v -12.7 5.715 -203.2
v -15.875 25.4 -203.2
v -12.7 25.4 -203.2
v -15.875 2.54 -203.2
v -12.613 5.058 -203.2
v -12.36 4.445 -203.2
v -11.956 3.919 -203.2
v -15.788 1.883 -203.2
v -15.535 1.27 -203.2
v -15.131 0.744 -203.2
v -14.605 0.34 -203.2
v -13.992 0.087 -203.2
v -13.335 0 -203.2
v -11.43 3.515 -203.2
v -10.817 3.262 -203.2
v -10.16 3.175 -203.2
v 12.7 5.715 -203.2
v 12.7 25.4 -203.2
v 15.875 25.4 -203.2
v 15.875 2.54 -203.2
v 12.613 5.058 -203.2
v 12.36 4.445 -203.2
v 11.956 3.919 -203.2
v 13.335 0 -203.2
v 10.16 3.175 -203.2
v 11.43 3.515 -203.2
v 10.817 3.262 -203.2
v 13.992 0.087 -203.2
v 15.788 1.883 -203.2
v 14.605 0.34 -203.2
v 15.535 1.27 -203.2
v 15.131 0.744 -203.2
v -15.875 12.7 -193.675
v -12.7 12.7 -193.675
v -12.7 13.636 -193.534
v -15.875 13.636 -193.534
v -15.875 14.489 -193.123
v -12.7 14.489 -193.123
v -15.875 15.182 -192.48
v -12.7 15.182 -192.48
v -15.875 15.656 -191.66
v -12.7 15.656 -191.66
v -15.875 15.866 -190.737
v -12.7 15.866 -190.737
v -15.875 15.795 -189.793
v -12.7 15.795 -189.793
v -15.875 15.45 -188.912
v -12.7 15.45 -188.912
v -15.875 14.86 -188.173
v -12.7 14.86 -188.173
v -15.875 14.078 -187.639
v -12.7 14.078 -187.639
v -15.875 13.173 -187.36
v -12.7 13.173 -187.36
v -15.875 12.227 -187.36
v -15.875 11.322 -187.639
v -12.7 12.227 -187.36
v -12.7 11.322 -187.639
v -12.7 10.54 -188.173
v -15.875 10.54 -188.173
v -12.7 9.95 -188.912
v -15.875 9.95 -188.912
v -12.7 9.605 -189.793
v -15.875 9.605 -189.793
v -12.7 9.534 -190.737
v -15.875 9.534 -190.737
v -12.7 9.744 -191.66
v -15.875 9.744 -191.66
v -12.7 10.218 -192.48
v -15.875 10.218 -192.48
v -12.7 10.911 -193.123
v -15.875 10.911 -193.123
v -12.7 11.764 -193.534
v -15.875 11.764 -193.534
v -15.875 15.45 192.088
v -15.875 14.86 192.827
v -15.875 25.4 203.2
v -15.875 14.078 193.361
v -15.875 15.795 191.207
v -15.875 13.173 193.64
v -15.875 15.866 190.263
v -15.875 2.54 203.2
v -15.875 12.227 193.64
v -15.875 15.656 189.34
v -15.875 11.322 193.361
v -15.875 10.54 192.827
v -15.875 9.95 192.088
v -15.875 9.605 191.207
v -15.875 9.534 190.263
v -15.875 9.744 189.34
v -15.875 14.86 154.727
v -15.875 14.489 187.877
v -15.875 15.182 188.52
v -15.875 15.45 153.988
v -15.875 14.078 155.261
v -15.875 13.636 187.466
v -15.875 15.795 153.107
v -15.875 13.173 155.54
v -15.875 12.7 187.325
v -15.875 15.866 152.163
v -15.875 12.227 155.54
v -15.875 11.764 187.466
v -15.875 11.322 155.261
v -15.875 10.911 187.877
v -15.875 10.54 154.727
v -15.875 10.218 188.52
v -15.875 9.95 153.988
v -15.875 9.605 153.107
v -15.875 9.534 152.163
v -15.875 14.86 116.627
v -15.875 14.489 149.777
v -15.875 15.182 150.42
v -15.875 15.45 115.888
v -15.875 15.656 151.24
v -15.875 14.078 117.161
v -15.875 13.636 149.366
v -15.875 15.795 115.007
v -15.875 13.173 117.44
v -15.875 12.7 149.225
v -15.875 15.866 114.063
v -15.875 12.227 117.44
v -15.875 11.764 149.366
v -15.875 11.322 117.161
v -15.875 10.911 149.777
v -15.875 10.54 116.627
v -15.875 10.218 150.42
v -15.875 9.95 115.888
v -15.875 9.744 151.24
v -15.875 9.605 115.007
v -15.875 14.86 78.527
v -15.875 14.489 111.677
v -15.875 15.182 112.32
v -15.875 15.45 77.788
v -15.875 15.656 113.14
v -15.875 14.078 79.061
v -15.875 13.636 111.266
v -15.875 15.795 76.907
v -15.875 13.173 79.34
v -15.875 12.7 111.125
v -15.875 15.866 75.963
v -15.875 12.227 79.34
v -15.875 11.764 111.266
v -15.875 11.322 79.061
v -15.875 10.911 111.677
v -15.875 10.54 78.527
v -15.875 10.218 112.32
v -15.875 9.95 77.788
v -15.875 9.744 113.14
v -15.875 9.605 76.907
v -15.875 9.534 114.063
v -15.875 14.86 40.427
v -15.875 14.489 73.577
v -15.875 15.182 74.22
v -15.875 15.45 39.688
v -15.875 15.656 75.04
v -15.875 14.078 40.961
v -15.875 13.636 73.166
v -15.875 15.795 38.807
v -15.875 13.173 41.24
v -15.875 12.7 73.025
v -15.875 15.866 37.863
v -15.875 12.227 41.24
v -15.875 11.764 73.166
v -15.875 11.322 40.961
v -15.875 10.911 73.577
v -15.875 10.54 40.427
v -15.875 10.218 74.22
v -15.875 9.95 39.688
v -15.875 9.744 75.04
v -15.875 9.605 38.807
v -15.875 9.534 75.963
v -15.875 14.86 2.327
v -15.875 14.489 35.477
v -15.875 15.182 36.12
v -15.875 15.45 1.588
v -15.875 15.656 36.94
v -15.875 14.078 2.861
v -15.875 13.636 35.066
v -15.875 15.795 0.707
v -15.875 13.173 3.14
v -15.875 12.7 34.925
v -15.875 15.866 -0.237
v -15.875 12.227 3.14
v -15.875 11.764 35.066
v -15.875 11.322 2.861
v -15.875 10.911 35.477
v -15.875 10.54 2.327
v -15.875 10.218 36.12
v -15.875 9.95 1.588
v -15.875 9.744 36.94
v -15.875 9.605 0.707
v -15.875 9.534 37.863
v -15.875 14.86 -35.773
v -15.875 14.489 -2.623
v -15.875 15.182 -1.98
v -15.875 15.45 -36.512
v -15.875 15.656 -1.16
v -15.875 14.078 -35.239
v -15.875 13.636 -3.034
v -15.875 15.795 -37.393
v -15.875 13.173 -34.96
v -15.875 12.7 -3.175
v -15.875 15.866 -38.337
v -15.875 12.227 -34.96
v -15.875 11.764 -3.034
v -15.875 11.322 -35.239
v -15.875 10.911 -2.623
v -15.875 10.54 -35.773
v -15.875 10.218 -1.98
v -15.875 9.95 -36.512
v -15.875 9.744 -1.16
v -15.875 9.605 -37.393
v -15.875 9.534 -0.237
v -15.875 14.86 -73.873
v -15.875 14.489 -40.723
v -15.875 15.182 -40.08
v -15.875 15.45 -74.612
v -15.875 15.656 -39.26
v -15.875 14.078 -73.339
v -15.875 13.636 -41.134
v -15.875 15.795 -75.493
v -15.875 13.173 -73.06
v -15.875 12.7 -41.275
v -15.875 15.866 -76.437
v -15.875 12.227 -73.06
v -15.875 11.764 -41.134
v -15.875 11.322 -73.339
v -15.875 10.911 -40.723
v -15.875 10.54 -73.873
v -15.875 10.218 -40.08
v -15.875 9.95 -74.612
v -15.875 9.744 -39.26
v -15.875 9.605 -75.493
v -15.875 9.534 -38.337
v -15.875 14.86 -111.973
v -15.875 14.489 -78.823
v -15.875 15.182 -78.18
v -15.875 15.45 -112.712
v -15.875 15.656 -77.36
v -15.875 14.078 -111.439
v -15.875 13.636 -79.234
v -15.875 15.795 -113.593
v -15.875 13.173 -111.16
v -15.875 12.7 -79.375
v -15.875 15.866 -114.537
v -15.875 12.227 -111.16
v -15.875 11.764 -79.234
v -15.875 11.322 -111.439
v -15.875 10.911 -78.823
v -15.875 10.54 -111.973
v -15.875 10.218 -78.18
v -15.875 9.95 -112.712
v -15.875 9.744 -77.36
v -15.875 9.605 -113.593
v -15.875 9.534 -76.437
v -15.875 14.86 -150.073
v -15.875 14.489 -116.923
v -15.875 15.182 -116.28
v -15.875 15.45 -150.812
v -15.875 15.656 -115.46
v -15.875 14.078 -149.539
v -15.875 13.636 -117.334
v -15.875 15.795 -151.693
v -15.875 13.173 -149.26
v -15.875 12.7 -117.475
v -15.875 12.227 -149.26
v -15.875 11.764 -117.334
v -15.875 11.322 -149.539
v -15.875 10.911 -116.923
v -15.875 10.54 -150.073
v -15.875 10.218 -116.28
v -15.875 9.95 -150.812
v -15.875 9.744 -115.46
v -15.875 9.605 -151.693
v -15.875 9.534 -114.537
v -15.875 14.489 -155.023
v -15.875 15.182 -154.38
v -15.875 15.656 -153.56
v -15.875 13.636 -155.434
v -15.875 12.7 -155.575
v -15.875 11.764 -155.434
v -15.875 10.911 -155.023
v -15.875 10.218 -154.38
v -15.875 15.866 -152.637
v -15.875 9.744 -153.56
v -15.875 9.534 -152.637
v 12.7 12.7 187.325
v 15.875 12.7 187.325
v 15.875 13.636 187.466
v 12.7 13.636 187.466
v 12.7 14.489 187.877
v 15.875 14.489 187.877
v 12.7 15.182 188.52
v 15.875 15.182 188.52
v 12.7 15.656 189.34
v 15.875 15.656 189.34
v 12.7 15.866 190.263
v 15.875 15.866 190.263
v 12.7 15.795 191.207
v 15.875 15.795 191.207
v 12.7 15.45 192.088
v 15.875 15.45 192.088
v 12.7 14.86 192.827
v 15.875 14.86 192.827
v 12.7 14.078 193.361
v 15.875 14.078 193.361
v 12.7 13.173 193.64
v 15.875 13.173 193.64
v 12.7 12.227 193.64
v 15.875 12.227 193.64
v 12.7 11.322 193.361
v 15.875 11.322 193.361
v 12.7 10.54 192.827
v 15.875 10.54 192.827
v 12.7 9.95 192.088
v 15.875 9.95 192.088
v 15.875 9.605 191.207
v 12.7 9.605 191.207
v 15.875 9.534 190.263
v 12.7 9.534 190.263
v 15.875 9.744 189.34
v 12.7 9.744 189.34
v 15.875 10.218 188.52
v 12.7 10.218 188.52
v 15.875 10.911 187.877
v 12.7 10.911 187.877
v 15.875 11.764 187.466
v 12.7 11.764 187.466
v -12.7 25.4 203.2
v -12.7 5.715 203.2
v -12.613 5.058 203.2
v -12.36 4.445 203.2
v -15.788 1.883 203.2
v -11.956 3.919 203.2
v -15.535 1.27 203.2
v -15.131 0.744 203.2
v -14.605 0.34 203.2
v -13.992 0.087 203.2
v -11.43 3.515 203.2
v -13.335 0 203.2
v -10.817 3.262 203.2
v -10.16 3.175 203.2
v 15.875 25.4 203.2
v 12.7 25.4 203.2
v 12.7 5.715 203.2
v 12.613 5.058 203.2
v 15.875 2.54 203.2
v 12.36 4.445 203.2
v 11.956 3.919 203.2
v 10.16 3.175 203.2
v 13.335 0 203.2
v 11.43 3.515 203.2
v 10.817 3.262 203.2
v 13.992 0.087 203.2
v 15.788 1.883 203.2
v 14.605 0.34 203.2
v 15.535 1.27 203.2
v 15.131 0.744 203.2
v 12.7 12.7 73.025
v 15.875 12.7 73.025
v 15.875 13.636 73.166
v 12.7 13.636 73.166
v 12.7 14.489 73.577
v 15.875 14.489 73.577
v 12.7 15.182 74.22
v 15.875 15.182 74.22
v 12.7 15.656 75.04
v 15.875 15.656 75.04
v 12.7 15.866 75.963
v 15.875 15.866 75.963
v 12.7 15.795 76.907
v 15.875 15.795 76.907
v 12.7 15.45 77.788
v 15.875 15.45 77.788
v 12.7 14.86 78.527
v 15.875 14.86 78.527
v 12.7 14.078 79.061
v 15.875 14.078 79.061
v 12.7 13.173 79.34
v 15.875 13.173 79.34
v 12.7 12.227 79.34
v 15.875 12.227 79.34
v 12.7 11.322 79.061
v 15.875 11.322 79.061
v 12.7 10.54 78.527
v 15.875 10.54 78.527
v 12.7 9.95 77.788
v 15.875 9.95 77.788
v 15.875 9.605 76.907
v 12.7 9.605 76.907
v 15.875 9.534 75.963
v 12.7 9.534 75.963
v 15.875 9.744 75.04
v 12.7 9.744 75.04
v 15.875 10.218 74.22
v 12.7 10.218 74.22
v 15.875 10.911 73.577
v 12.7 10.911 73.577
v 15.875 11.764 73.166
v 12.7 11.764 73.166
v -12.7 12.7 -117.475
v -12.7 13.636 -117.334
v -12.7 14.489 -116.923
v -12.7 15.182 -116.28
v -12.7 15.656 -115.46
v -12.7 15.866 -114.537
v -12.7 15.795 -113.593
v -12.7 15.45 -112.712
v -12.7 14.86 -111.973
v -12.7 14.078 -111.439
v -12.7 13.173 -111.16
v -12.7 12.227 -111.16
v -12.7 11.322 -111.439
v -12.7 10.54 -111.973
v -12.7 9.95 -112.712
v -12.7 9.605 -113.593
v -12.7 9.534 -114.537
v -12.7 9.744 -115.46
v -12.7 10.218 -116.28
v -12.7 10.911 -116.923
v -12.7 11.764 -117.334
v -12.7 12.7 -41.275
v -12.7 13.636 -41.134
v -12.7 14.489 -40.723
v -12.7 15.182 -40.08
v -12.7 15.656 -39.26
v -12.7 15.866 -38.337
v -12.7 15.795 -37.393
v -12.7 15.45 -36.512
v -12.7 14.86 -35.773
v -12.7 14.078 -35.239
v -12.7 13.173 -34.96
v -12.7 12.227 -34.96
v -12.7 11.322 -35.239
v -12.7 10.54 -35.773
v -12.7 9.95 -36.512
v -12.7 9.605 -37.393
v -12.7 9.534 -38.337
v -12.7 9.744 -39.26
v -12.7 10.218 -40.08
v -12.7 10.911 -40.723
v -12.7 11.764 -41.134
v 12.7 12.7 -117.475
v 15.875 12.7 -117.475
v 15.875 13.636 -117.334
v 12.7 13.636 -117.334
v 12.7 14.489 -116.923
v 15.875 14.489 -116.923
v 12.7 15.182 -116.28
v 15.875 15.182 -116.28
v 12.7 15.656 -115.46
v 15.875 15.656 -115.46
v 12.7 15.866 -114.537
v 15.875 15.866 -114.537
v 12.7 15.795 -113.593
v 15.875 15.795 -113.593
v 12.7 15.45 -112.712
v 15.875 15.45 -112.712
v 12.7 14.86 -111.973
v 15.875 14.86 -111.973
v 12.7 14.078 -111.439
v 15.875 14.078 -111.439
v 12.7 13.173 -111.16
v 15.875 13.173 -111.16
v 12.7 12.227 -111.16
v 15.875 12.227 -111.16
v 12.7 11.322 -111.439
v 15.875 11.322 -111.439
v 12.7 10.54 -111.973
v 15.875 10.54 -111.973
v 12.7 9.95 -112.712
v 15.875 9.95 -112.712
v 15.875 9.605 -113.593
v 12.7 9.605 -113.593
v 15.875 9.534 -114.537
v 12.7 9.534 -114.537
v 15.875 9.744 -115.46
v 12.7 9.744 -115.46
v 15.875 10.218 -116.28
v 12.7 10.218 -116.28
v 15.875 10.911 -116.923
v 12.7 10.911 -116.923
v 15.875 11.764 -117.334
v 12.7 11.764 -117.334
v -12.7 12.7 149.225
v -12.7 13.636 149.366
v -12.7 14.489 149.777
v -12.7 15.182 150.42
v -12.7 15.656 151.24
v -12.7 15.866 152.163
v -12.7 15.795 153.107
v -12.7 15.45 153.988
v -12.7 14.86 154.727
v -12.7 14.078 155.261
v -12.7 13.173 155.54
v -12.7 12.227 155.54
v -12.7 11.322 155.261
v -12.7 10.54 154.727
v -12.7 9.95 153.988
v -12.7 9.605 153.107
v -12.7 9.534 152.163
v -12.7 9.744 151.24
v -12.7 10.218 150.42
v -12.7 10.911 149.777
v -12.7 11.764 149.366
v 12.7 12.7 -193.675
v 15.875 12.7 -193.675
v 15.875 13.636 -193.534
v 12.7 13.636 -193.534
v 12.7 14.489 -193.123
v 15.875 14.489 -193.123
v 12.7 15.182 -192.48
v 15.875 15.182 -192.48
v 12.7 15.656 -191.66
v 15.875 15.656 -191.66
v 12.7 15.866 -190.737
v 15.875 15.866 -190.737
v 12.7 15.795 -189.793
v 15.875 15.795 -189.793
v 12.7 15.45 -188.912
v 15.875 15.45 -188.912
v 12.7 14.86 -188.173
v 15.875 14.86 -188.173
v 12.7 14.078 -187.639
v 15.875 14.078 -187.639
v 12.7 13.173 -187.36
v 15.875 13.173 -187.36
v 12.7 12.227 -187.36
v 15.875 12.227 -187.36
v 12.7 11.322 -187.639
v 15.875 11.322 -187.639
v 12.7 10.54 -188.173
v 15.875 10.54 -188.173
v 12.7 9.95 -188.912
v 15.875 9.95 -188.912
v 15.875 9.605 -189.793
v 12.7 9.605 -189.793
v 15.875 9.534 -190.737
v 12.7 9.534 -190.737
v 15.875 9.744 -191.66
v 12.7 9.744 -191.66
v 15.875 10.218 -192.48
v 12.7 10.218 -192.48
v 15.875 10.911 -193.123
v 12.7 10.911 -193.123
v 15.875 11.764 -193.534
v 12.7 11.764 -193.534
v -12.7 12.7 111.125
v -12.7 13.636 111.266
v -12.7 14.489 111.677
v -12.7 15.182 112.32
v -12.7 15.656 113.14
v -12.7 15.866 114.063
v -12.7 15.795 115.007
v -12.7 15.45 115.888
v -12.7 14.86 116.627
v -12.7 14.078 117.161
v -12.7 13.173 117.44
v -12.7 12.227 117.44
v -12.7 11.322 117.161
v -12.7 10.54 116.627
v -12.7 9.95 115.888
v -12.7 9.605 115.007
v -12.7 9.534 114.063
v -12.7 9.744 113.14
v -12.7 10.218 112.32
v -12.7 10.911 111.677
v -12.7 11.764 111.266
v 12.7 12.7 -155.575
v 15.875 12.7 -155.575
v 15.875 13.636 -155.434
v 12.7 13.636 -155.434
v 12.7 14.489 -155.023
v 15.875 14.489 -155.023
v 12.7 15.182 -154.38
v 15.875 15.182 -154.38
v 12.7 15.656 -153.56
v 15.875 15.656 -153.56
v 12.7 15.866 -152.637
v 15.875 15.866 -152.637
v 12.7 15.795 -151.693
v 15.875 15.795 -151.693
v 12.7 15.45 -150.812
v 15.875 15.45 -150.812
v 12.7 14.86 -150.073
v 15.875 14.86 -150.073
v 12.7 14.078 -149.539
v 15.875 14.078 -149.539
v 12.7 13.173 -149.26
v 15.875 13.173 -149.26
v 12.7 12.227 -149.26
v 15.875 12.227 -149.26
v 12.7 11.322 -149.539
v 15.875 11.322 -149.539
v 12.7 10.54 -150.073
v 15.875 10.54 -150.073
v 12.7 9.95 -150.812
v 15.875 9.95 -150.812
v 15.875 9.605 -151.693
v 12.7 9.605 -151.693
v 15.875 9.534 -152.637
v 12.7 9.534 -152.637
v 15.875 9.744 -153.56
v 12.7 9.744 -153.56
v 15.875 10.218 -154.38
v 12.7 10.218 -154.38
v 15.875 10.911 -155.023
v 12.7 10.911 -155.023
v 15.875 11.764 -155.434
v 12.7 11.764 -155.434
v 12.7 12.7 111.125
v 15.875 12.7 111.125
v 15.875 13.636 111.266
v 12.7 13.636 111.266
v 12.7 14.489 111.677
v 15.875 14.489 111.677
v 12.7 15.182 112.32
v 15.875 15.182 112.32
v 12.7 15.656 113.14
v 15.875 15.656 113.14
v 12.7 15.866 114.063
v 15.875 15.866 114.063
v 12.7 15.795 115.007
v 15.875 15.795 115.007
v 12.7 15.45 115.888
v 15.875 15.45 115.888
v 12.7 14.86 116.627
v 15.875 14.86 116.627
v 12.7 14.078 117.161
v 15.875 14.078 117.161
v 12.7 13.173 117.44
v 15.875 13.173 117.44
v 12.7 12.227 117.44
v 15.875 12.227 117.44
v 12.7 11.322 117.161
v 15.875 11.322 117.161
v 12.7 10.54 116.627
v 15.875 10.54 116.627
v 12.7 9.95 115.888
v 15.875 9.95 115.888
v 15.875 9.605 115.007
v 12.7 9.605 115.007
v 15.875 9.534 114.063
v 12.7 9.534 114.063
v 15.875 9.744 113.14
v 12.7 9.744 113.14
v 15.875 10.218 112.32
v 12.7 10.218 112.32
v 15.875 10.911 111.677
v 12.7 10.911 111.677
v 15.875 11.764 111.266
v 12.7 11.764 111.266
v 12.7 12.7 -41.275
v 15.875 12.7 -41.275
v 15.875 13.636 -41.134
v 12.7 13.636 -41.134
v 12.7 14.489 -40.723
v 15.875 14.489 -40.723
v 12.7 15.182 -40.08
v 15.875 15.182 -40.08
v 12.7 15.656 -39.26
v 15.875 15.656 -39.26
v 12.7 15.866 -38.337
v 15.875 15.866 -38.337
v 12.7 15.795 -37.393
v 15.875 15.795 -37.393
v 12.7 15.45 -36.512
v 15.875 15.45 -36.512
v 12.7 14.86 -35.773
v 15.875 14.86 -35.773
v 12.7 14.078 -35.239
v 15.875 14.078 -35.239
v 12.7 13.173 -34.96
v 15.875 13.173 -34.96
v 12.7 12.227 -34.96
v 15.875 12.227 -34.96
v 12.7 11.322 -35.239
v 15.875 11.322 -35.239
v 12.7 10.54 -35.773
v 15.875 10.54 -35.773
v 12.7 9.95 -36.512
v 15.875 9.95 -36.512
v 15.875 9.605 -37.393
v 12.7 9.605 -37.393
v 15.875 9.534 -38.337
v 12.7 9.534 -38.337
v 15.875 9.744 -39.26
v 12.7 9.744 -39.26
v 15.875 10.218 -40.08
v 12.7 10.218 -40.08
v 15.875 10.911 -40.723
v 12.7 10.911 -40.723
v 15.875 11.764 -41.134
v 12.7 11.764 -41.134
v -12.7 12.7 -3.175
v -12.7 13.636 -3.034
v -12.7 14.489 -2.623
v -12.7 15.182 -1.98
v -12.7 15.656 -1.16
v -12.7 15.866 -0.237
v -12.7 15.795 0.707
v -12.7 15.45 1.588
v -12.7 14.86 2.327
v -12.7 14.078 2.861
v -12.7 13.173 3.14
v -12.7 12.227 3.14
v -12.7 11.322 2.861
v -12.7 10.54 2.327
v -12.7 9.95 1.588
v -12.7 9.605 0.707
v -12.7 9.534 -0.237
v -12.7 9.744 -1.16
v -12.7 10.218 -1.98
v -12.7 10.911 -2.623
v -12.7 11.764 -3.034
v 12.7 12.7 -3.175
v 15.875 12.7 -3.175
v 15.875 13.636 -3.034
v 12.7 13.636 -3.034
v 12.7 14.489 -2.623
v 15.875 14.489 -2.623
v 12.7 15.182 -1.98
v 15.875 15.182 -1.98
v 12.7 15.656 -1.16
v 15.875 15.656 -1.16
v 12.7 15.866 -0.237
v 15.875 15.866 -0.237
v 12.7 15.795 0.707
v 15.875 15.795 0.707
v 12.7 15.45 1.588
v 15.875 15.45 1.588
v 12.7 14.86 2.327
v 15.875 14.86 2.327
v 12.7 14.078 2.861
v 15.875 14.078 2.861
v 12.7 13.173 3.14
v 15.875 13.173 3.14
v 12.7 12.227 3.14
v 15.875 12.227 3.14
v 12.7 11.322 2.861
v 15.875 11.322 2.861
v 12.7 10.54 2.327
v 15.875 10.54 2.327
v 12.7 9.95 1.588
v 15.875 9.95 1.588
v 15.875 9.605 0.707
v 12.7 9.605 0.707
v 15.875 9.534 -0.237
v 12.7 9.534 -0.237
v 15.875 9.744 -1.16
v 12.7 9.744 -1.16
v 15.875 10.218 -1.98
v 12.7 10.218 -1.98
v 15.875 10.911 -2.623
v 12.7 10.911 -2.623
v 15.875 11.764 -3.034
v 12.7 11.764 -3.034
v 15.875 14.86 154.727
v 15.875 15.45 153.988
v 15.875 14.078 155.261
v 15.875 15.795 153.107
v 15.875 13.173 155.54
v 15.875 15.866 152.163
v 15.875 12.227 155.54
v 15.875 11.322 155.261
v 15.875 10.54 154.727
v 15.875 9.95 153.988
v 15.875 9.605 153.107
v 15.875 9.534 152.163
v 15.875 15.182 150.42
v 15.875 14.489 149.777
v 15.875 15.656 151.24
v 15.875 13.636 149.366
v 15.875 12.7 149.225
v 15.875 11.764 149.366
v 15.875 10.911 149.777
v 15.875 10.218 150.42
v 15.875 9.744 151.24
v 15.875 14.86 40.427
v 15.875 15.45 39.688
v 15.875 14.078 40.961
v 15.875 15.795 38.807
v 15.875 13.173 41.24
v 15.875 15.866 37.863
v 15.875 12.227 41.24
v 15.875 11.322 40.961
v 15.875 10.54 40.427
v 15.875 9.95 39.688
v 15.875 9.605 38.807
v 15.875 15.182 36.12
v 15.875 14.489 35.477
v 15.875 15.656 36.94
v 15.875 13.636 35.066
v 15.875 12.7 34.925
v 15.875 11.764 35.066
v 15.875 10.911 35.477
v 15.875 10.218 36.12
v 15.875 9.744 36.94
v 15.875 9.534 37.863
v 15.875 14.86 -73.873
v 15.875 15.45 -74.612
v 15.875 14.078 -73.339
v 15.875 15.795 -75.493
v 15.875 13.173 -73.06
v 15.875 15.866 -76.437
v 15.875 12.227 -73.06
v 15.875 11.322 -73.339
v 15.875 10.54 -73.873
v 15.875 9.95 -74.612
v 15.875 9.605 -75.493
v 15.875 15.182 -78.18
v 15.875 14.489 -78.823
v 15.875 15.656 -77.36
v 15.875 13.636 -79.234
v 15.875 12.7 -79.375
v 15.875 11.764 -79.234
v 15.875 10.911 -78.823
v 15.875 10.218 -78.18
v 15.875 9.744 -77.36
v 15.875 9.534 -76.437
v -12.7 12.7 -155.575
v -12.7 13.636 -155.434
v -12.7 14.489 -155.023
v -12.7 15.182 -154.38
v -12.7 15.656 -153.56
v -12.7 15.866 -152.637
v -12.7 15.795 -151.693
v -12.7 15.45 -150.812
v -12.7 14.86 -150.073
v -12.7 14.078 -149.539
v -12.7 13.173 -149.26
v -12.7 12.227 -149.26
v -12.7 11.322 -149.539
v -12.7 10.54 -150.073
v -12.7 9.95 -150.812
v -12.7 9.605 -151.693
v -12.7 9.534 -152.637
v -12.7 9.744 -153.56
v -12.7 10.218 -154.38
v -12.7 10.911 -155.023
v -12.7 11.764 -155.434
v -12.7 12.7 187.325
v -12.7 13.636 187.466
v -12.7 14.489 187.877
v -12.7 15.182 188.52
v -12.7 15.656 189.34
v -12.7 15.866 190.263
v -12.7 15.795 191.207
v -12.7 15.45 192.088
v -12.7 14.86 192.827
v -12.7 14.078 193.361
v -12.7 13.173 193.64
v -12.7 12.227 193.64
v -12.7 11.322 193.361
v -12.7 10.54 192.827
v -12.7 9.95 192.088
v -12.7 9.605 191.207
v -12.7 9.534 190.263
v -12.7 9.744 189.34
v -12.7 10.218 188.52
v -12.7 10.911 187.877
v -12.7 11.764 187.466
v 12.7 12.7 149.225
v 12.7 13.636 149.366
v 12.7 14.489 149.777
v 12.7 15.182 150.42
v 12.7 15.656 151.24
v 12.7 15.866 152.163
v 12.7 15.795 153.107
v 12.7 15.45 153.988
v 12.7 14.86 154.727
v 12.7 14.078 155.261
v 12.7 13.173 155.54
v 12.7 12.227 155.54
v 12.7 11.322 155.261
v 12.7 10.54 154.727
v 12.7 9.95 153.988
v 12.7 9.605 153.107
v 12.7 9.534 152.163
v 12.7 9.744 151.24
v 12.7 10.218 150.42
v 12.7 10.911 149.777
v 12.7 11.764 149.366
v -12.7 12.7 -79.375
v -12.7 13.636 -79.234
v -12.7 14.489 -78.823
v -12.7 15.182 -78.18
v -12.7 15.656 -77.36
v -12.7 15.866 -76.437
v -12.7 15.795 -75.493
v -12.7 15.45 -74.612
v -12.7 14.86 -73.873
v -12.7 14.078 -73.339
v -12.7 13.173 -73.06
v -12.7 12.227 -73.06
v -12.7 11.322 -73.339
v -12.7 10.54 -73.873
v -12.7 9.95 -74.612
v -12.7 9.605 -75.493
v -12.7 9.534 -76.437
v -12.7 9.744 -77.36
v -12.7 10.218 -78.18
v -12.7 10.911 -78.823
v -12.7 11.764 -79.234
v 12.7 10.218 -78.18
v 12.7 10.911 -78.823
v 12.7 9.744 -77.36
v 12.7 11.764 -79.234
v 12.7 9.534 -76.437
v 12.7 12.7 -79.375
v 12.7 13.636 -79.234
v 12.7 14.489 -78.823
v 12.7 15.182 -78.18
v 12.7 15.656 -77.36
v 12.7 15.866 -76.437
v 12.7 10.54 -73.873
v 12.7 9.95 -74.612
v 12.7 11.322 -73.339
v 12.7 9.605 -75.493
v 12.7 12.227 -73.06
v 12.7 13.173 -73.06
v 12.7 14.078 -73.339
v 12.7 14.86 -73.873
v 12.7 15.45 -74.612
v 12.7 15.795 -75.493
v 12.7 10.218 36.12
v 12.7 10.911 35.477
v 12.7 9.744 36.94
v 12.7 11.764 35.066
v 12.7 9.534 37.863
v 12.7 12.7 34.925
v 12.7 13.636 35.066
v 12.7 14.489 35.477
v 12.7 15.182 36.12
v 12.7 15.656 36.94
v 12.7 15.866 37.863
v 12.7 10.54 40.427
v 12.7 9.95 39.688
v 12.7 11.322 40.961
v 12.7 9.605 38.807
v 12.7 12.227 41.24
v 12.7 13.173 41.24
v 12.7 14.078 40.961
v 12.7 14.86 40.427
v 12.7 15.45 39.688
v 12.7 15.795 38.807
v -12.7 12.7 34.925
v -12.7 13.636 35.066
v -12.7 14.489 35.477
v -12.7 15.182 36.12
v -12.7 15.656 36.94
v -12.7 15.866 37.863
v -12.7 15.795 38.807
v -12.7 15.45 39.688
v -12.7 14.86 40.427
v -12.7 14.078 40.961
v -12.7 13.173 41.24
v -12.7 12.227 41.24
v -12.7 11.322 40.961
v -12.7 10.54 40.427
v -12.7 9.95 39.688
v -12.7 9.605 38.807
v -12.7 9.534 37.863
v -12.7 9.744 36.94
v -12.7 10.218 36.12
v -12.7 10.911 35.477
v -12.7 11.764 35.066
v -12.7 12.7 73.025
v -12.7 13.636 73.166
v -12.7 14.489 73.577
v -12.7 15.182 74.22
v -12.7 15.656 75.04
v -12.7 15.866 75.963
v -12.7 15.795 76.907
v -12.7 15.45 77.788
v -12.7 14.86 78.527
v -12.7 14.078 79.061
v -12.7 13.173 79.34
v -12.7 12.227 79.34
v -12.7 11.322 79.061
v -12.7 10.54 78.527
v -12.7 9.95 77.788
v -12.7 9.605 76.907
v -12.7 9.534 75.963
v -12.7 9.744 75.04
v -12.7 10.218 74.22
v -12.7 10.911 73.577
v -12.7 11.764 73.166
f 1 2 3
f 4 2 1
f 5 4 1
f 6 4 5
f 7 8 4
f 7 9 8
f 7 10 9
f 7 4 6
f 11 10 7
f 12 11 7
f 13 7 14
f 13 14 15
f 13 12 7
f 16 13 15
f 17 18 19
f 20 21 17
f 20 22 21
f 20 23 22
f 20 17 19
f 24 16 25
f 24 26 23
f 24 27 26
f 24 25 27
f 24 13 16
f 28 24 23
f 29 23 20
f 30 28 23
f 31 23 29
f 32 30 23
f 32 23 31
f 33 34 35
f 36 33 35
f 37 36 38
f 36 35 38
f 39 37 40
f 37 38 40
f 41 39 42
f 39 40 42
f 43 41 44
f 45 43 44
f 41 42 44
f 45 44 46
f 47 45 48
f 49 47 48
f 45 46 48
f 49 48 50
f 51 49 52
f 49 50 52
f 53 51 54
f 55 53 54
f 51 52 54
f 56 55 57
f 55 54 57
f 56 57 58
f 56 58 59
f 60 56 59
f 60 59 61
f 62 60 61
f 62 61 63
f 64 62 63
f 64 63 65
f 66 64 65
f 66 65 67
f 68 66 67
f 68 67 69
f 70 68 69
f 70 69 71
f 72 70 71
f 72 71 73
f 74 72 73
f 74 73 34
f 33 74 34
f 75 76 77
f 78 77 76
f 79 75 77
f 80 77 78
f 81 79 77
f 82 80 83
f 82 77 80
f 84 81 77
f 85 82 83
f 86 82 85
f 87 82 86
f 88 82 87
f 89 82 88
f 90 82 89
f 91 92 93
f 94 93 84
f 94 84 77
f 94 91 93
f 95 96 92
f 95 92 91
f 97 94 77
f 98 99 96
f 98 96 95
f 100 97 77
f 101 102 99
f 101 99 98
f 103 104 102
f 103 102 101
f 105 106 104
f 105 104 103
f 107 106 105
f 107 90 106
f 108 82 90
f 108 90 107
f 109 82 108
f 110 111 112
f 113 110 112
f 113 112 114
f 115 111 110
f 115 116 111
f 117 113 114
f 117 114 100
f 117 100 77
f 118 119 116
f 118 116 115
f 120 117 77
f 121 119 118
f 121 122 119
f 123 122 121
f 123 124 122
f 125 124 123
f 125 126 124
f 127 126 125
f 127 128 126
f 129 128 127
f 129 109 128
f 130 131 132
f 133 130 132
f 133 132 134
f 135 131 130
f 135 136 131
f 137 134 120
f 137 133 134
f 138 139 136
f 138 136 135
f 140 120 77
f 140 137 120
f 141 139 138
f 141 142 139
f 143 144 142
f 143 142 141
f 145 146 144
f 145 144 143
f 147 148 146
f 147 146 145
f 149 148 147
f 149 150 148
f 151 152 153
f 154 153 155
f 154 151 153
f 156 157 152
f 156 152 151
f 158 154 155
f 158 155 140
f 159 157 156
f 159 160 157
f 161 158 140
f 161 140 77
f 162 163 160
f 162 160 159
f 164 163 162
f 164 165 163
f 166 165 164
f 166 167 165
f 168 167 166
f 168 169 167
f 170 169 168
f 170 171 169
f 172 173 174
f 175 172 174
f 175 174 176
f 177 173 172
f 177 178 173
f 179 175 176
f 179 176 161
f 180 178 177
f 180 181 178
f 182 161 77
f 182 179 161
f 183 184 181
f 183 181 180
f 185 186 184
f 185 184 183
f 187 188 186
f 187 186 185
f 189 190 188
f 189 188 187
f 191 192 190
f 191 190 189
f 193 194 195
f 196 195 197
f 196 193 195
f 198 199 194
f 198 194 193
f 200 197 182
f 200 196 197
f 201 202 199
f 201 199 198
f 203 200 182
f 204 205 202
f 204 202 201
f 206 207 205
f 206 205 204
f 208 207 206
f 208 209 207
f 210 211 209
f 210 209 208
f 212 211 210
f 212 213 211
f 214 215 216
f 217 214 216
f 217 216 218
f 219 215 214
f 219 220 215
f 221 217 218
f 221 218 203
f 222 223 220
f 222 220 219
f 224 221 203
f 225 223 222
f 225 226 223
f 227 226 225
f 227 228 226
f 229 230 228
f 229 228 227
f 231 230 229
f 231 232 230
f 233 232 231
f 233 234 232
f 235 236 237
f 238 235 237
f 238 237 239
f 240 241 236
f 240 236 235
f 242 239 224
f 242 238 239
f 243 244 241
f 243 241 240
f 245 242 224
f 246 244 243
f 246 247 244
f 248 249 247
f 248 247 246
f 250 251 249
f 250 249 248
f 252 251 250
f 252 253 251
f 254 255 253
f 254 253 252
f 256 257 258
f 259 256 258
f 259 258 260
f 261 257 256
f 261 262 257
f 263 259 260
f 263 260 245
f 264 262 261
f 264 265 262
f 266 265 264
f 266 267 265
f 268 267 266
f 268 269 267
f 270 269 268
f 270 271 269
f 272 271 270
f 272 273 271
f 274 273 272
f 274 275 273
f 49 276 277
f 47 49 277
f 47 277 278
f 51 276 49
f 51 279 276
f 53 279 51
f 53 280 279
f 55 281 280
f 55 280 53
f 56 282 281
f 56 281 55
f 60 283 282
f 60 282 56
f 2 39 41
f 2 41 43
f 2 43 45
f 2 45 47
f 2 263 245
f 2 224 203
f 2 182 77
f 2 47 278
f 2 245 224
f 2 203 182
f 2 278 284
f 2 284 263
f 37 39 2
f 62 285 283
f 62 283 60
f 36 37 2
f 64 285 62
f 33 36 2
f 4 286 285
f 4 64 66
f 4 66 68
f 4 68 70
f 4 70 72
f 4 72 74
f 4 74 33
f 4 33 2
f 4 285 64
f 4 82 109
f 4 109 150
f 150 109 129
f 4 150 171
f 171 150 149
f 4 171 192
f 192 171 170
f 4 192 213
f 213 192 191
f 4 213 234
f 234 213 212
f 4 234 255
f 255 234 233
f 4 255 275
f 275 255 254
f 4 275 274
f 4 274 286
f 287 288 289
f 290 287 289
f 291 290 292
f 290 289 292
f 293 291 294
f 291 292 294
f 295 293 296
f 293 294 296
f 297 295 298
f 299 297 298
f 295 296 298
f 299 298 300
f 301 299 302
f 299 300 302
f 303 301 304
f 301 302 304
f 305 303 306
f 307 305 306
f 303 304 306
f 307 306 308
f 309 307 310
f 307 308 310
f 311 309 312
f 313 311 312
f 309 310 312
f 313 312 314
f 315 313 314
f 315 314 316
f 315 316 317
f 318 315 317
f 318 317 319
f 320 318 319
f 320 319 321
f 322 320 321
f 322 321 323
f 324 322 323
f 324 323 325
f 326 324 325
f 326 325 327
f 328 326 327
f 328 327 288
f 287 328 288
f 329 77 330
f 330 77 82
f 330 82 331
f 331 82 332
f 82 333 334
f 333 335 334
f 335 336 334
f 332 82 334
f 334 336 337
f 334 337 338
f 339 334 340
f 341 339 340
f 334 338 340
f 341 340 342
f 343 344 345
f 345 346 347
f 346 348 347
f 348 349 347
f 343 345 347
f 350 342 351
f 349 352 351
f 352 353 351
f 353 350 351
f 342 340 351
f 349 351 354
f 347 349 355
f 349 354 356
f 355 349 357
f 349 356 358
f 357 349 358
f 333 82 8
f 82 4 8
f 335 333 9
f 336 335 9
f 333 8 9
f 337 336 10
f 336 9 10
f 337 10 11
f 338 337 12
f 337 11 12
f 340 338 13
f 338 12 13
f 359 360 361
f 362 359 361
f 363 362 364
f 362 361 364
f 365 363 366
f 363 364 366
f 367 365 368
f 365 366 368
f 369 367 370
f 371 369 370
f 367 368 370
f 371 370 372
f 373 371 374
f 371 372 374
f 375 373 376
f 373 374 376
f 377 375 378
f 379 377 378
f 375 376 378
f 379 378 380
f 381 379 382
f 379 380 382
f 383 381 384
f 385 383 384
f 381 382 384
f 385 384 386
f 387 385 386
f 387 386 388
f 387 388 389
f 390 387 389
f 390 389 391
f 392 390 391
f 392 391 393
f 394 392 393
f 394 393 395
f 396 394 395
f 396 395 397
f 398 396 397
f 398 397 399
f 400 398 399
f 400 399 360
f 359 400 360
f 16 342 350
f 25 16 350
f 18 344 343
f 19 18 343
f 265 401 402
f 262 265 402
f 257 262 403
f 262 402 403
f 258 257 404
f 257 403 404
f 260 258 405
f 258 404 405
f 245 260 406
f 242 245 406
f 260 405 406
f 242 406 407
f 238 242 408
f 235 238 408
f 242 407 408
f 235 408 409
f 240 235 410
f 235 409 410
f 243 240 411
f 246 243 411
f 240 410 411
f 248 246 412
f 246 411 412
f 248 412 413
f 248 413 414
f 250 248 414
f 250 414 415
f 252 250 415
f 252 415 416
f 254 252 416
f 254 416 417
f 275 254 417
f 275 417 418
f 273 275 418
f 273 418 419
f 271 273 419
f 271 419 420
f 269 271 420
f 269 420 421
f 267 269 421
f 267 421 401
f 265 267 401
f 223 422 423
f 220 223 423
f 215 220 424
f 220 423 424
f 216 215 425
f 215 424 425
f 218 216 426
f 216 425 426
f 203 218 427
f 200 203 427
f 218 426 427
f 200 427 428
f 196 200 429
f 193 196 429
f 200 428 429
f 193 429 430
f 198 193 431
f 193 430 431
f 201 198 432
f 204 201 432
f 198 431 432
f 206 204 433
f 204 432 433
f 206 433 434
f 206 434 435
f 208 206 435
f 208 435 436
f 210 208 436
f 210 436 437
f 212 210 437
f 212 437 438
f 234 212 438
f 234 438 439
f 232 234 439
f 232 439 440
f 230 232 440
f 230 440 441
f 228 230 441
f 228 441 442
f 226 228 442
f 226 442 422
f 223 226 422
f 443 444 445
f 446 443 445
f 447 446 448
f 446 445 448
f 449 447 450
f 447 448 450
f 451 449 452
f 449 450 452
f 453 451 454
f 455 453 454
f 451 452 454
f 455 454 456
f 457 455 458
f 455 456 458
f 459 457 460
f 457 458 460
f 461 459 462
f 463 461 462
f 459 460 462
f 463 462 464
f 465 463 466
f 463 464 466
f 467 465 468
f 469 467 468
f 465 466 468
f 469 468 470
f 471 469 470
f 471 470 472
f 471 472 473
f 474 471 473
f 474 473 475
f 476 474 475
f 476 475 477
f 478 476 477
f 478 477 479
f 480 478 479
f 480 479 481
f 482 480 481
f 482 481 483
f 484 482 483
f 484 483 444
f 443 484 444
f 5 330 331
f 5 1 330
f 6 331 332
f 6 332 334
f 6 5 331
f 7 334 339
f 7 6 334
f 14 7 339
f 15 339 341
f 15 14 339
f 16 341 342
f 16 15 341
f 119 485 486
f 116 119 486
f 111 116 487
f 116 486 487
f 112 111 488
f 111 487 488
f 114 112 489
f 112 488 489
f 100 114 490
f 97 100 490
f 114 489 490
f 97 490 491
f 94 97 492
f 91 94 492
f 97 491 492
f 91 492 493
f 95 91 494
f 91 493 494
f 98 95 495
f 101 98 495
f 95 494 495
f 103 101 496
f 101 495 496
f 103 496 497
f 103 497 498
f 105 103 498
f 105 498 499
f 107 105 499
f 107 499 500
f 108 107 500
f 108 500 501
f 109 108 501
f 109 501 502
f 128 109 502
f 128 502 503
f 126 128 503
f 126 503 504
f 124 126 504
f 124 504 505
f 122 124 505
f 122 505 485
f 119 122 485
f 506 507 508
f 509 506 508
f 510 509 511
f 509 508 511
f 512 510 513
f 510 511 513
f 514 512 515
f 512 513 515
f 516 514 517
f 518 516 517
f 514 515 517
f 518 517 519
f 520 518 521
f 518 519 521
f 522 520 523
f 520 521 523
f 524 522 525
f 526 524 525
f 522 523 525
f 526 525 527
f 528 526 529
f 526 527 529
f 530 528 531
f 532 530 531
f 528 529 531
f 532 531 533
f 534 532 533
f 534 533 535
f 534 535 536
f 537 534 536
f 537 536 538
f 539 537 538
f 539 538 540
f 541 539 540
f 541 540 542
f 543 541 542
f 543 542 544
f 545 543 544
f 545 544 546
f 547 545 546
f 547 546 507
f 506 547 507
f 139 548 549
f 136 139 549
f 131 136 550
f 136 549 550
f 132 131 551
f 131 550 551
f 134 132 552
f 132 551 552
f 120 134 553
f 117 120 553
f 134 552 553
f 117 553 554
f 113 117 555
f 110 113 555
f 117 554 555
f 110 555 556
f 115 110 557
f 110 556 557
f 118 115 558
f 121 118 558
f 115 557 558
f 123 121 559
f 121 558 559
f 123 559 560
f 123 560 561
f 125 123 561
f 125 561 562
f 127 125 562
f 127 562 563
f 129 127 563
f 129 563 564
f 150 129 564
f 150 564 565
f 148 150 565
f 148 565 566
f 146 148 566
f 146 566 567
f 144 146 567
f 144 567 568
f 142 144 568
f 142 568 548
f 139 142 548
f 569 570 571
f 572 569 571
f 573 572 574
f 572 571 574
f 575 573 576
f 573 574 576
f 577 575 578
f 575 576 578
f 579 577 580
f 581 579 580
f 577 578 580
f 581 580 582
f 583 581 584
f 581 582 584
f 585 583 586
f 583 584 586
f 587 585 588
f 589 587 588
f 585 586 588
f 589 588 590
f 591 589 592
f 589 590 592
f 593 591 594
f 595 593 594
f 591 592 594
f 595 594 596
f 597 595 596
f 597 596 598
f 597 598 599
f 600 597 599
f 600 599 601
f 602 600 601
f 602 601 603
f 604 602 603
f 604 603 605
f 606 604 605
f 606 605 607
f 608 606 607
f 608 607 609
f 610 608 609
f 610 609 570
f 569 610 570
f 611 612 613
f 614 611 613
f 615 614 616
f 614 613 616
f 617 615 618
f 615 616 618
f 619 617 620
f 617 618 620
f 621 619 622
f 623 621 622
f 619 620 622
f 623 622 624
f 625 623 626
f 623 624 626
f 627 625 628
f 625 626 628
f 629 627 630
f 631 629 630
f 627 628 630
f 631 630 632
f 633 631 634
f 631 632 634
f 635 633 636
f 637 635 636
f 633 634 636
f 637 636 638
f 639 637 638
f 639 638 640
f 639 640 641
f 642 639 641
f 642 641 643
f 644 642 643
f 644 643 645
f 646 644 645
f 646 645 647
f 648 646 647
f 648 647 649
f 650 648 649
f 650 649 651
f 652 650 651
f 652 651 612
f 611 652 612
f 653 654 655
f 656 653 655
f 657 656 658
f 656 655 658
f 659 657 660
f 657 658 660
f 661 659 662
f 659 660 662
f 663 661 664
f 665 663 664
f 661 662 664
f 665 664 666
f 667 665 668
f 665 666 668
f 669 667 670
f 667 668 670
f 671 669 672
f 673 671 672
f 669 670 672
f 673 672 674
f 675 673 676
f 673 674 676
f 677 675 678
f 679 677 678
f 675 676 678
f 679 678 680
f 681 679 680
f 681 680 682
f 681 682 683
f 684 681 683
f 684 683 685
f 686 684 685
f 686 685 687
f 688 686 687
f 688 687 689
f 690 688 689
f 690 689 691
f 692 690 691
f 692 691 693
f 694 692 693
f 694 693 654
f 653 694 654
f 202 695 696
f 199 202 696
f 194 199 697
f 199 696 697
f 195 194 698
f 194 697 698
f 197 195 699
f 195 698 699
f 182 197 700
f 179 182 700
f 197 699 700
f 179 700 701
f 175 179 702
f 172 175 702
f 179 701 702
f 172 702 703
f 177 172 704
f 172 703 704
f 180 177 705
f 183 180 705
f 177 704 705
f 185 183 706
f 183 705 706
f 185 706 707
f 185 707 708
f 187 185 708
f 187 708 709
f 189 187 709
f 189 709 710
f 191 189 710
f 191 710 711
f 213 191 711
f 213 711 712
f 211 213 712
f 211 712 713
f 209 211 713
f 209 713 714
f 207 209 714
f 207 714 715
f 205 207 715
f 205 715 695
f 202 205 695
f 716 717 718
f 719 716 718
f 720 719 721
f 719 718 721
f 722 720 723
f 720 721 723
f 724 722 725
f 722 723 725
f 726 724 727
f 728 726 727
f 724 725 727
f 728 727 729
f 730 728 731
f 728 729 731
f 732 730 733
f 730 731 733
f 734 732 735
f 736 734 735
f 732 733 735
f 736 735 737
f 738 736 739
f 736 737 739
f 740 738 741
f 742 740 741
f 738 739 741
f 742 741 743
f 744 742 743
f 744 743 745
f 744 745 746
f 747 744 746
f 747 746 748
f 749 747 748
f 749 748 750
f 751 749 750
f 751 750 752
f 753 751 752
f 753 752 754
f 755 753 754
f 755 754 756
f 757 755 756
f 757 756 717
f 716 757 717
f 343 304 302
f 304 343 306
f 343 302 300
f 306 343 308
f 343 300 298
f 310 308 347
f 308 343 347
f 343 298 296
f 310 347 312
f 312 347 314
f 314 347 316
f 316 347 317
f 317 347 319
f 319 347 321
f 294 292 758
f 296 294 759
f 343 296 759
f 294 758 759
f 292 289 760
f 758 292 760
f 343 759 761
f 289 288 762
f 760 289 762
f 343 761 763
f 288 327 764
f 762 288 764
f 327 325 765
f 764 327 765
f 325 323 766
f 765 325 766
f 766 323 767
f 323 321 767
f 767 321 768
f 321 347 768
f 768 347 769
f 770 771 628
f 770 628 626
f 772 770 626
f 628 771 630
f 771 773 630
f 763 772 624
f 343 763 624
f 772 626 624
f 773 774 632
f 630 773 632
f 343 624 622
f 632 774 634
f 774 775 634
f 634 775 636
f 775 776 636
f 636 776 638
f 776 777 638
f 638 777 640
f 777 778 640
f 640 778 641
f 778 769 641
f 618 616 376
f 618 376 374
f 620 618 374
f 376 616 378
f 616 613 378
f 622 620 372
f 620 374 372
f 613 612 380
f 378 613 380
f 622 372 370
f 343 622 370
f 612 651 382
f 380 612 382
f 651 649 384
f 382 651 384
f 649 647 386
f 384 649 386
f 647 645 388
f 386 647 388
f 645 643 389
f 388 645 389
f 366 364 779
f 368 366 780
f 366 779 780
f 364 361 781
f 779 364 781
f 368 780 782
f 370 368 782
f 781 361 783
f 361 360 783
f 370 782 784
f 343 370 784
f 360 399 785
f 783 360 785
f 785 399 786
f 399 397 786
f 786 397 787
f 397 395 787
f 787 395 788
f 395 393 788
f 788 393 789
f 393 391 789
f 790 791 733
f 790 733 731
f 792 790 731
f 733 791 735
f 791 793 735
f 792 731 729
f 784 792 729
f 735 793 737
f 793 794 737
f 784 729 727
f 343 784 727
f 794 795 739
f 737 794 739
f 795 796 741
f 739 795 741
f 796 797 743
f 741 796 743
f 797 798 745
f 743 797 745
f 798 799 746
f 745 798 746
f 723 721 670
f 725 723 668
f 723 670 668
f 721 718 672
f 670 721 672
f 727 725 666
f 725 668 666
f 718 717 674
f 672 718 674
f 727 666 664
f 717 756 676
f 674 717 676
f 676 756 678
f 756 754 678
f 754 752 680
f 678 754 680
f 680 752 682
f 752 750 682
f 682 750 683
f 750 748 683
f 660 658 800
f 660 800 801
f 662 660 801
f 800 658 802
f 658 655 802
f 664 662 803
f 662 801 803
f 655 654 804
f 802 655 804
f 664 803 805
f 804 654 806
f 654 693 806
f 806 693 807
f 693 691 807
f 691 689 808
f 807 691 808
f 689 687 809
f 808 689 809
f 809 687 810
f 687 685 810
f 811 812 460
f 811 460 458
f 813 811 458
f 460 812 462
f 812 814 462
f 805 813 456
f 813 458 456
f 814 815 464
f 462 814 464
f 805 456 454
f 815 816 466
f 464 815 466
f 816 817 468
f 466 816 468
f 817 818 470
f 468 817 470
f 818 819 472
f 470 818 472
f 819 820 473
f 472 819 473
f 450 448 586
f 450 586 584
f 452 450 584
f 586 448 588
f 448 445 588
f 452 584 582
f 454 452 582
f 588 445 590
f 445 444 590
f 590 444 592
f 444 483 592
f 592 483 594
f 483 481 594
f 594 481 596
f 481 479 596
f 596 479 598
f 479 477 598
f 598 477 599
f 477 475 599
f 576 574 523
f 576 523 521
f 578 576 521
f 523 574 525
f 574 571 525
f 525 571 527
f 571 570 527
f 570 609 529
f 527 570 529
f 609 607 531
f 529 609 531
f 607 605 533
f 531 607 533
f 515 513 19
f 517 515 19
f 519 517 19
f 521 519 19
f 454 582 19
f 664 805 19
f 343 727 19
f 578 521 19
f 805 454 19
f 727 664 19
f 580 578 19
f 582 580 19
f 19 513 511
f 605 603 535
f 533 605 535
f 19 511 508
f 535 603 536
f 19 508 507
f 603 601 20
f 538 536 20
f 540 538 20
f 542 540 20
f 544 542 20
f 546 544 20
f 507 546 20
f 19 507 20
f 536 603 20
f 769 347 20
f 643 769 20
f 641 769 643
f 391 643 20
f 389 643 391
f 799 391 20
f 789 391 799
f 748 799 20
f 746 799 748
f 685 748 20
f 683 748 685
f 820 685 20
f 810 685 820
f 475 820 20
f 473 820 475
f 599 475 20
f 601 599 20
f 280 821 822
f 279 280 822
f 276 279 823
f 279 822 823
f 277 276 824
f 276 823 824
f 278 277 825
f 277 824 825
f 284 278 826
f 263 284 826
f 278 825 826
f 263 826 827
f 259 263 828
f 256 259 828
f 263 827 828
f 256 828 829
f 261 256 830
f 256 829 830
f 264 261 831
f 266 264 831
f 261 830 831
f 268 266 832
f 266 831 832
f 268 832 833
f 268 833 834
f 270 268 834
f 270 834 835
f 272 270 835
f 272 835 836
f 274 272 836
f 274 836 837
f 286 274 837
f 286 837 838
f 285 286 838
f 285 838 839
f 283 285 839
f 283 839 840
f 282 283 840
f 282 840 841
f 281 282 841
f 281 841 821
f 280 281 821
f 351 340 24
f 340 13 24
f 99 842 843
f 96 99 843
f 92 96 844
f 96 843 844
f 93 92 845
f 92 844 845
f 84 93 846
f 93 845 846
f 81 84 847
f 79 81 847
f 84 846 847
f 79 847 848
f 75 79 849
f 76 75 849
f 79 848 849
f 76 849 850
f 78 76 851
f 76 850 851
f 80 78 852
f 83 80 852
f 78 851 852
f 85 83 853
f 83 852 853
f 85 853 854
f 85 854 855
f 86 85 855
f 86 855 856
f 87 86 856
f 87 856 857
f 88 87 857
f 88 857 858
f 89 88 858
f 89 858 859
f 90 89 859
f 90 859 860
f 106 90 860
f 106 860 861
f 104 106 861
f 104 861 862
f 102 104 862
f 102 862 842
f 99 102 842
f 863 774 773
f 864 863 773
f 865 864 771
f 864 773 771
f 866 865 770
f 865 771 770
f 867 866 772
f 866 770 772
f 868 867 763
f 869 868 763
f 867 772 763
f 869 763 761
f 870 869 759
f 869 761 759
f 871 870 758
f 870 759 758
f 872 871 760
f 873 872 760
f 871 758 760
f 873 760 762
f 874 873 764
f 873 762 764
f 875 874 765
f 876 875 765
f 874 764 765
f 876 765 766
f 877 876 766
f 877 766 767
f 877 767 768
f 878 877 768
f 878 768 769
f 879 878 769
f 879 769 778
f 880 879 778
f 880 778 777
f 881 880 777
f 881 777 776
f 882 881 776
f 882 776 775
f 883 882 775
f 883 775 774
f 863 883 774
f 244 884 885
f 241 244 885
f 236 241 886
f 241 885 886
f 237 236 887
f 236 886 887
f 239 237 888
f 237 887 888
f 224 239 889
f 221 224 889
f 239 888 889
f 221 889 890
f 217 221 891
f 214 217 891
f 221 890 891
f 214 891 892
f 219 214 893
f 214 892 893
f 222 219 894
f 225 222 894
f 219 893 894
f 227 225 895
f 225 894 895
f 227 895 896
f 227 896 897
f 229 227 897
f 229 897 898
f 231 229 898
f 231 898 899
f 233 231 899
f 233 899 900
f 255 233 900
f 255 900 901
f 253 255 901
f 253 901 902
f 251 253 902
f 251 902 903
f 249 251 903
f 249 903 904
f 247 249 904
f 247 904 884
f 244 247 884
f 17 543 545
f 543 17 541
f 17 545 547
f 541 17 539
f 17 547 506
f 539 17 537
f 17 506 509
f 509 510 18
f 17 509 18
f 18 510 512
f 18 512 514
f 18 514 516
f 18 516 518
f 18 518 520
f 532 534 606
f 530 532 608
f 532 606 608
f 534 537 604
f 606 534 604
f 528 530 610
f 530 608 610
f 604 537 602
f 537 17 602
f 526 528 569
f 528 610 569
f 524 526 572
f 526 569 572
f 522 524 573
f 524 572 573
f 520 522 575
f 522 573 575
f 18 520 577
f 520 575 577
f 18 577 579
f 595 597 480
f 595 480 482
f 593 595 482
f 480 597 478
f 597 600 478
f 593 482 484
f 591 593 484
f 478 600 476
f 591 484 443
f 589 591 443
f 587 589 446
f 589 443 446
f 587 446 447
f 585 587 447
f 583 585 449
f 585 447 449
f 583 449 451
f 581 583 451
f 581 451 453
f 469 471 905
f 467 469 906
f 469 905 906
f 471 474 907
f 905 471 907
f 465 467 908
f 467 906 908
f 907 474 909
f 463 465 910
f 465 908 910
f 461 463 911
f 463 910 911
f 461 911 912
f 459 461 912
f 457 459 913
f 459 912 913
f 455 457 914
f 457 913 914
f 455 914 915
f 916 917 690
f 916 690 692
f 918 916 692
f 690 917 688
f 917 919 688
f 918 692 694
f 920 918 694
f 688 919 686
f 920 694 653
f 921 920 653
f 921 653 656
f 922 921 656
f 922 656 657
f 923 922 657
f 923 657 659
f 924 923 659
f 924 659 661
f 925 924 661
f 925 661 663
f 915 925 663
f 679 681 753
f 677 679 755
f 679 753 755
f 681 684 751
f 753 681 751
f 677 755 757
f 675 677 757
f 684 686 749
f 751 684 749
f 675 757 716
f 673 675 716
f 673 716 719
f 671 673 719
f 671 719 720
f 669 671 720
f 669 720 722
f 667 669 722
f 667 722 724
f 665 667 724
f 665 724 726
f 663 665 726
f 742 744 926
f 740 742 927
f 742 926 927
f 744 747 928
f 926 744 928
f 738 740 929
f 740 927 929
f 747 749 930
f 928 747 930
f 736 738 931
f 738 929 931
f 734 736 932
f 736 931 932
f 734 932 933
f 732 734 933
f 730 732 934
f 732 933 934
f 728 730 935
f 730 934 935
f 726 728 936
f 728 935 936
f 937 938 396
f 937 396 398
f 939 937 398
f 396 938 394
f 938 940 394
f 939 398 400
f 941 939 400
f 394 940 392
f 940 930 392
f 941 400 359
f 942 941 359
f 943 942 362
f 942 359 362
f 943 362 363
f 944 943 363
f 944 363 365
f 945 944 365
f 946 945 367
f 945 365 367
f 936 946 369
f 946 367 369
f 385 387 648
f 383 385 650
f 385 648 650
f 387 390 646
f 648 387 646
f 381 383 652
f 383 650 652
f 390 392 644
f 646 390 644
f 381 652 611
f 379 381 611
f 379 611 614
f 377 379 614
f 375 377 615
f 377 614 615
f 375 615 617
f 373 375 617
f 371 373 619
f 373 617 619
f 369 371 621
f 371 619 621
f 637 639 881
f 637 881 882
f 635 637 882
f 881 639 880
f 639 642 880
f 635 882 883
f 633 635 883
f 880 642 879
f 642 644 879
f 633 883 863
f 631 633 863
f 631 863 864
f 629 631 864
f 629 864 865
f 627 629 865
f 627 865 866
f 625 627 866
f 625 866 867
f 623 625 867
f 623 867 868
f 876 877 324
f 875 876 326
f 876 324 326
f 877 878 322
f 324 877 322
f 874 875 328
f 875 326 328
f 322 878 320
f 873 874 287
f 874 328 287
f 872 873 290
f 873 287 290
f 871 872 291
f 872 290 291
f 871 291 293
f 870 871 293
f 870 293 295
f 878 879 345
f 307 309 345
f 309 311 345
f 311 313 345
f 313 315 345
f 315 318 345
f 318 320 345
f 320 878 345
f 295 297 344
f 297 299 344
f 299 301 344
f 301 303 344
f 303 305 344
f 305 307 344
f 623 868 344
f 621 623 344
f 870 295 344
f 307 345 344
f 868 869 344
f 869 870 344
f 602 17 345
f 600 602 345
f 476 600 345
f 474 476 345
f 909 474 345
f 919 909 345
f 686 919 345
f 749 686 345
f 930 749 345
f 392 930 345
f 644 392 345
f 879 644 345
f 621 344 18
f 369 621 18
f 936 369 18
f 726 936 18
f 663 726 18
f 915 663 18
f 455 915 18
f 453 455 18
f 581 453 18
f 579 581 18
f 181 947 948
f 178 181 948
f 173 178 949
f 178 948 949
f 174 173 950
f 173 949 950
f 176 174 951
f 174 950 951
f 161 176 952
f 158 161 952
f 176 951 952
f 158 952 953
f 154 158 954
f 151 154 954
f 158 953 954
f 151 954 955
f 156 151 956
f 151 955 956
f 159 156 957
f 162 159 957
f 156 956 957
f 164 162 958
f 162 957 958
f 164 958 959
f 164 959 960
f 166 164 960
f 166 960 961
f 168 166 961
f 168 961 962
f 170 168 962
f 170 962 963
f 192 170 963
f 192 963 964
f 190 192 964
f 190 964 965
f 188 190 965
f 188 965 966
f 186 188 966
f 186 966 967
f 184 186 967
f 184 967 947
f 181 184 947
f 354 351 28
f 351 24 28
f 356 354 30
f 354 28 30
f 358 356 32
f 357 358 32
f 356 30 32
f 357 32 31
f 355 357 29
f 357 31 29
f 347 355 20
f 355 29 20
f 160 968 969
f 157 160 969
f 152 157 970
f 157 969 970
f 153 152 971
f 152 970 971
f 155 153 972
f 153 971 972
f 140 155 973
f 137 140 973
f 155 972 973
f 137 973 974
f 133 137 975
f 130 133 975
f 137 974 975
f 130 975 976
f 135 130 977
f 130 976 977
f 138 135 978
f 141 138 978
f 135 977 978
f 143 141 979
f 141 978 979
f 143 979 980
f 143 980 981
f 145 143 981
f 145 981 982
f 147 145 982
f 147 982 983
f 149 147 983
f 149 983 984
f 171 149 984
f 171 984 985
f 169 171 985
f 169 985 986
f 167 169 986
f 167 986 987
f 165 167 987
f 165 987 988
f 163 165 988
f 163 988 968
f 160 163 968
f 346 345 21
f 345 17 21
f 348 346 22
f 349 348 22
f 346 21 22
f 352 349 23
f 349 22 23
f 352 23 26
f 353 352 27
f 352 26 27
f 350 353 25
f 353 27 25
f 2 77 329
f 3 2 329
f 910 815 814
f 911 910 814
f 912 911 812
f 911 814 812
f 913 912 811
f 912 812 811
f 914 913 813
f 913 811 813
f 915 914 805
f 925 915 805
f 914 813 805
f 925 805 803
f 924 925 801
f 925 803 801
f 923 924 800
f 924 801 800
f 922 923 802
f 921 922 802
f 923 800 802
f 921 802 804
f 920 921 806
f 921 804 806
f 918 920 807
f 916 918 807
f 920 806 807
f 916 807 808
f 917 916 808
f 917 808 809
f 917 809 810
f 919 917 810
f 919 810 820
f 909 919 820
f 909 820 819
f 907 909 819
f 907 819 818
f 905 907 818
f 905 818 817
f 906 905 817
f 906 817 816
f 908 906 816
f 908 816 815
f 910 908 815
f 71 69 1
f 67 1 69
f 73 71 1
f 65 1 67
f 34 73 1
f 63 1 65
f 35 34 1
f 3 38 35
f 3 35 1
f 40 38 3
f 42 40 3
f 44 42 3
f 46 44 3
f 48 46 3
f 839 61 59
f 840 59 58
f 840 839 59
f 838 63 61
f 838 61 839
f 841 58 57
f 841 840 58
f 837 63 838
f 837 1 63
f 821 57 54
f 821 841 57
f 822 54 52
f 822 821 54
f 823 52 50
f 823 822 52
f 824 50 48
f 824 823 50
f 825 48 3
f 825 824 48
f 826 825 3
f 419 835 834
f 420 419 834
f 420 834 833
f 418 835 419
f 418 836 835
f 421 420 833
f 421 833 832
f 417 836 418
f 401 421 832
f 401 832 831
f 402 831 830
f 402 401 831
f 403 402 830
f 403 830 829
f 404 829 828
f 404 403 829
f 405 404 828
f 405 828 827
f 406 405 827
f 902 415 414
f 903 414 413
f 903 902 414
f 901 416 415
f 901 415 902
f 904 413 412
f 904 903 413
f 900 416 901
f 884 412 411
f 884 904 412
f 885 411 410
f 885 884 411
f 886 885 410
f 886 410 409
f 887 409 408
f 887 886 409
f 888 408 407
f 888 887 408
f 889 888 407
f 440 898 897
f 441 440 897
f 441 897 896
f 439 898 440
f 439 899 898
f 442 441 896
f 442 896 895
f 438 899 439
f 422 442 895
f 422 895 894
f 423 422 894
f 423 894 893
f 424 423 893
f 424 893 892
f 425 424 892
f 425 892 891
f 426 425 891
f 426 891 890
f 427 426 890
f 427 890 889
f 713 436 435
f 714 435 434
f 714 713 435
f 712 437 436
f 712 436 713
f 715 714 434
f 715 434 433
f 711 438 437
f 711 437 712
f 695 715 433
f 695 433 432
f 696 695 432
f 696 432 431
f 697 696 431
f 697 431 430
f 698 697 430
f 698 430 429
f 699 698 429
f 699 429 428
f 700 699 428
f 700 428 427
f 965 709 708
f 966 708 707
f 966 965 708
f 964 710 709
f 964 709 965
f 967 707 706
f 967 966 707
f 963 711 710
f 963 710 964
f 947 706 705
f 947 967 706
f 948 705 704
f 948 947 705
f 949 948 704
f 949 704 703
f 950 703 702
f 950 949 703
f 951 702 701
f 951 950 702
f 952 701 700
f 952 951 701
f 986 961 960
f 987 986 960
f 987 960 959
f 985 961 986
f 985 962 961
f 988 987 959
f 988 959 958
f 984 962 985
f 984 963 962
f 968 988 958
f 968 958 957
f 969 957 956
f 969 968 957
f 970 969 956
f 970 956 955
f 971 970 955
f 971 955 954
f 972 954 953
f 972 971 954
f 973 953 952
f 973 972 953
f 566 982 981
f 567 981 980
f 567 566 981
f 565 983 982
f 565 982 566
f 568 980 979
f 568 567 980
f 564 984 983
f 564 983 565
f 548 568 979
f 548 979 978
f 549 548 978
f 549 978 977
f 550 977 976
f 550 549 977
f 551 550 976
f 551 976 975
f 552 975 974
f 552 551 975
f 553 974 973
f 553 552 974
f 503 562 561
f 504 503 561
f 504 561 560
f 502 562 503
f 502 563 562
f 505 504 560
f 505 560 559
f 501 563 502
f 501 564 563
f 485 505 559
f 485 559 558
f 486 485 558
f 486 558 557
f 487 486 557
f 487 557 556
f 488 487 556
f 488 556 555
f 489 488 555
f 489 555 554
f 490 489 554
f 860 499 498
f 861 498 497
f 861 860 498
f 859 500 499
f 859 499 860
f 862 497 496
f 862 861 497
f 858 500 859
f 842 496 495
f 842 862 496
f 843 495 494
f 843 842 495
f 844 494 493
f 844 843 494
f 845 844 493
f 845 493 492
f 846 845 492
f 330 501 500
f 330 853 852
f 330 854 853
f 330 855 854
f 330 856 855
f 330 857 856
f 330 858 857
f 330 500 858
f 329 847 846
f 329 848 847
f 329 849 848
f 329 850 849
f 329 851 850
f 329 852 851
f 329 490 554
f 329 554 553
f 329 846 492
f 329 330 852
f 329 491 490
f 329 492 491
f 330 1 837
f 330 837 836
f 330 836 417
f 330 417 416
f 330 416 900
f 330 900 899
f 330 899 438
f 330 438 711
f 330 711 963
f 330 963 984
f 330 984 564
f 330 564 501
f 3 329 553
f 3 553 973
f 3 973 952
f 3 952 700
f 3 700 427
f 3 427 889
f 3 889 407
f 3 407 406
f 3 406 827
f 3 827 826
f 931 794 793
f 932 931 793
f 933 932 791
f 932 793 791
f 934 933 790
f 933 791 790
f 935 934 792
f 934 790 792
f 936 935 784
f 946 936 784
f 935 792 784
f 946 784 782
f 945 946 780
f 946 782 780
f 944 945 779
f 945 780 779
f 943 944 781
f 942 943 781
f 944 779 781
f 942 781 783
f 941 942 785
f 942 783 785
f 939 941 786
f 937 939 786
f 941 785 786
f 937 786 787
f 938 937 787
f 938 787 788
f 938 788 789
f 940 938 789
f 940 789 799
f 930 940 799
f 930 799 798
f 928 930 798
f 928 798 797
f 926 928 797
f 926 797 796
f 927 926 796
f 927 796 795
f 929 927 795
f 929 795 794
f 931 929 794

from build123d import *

# Parameters (mm, degrees)
SKETCH2_W           = 31.75
SKETCH2_H           = 406.4
BOSS_EXTRUDE1_DEPTH = 25.4
SKETCH3_W           = 25.4
SKETCH3_H           = 22.225
CUT_EXTRUDE1_DEPTH  = 406.4
FILLET1_R           = 2.54
FILLET3_R           = 2.54
SKETCH4_R           = 3.175
CUT_EXTRUDE2_DEPTH  = 50.8


with BuildPart() as part:
    # Sketch2 → Boss-Extrude1 (new body)
    with BuildSketch(Plane(origin=(0, 0, 0), x_dir=(1, 0, 0), z_dir=(0, 1, 0))):
        Rectangle(SKETCH2_W, SKETCH2_H)
    extrude(amount=BOSS_EXTRUDE1_DEPTH)

    # Sketch3 → Cut-Extrude1 (cut)
    with BuildSketch(Plane.XY.offset(203.2)):
        with Locations((0, 14.2875)):
            Rectangle(SKETCH3_W, SKETCH3_H)
    extrude(amount=-CUT_EXTRUDE1_DEPTH, mode=Mode.SUBTRACT)

    # Fillet1
    fillet1_edges = [part.edges().sort_by_distance(p)[0] for p in [
        (-15.875, 0, 0),
        (15.875, 0, 0),
    ]]
    fillet(fillet1_edges, radius=FILLET1_R)

    # Fillet3
    fillet3_edges = [part.edges().sort_by_distance(p)[0] for p in [
        (-12.7, 3.175, 0),
        (12.7, 3.175, 0),
    ]]
    fillet(fillet3_edges, radius=FILLET3_R)

    # Sketch4 → Cut-Extrude2 (cut)
    with BuildSketch(Plane(origin=(15.875, 0, 0), x_dir=(0, 0, -1), z_dir=(1, 0, 0))):
        with Locations((-190.5, 12.7)):
            Circle(SKETCH4_R)
        with Locations((-152.4, 12.7)):
            Circle(SKETCH4_R)
        with Locations((-114.3, 12.7)):
            Circle(SKETCH4_R)
        with Locations((-76.2, 12.7)):
            Circle(SKETCH4_R)
        with Locations((-38.1, 12.7)):
            Circle(SKETCH4_R)
        with Locations((0, 12.7)):
            Circle(SKETCH4_R)
        with Locations((38.1, 12.7)):
            Circle(SKETCH4_R)
        with Locations((76.2, 12.7)):
            Circle(SKETCH4_R)
        with Locations((114.3, 12.7)):
            Circle(SKETCH4_R)
        with Locations((152.4, 12.7)):
            Circle(SKETCH4_R)
        with Locations((190.5, 12.7)):
            Circle(SKETCH4_R)
    extrude(amount=-CUT_EXTRUDE2_DEPTH, mode=Mode.SUBTRACT)


solid = part.part
